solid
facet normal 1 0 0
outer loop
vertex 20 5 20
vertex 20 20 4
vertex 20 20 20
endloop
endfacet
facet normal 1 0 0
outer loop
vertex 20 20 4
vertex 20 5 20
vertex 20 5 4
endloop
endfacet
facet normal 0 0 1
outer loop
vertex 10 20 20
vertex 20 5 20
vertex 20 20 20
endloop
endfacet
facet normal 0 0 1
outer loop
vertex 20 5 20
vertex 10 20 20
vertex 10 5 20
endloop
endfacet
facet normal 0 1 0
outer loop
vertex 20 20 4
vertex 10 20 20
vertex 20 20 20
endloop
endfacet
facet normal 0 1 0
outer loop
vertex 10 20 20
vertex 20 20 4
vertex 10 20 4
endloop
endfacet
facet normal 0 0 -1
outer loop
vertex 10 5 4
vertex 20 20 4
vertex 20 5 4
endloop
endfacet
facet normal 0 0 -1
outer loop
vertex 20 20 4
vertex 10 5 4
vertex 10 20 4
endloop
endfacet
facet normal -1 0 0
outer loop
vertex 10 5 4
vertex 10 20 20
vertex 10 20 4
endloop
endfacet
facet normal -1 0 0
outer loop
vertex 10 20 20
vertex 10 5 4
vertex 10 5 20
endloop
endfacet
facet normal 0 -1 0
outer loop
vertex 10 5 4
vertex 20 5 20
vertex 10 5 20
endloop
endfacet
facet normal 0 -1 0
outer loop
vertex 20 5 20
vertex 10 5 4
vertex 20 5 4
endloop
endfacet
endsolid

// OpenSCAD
intersection() {
  cube([20, 20, 20]);
  translate([10, 5, 4]) cube([20, 20, 20]);
}
